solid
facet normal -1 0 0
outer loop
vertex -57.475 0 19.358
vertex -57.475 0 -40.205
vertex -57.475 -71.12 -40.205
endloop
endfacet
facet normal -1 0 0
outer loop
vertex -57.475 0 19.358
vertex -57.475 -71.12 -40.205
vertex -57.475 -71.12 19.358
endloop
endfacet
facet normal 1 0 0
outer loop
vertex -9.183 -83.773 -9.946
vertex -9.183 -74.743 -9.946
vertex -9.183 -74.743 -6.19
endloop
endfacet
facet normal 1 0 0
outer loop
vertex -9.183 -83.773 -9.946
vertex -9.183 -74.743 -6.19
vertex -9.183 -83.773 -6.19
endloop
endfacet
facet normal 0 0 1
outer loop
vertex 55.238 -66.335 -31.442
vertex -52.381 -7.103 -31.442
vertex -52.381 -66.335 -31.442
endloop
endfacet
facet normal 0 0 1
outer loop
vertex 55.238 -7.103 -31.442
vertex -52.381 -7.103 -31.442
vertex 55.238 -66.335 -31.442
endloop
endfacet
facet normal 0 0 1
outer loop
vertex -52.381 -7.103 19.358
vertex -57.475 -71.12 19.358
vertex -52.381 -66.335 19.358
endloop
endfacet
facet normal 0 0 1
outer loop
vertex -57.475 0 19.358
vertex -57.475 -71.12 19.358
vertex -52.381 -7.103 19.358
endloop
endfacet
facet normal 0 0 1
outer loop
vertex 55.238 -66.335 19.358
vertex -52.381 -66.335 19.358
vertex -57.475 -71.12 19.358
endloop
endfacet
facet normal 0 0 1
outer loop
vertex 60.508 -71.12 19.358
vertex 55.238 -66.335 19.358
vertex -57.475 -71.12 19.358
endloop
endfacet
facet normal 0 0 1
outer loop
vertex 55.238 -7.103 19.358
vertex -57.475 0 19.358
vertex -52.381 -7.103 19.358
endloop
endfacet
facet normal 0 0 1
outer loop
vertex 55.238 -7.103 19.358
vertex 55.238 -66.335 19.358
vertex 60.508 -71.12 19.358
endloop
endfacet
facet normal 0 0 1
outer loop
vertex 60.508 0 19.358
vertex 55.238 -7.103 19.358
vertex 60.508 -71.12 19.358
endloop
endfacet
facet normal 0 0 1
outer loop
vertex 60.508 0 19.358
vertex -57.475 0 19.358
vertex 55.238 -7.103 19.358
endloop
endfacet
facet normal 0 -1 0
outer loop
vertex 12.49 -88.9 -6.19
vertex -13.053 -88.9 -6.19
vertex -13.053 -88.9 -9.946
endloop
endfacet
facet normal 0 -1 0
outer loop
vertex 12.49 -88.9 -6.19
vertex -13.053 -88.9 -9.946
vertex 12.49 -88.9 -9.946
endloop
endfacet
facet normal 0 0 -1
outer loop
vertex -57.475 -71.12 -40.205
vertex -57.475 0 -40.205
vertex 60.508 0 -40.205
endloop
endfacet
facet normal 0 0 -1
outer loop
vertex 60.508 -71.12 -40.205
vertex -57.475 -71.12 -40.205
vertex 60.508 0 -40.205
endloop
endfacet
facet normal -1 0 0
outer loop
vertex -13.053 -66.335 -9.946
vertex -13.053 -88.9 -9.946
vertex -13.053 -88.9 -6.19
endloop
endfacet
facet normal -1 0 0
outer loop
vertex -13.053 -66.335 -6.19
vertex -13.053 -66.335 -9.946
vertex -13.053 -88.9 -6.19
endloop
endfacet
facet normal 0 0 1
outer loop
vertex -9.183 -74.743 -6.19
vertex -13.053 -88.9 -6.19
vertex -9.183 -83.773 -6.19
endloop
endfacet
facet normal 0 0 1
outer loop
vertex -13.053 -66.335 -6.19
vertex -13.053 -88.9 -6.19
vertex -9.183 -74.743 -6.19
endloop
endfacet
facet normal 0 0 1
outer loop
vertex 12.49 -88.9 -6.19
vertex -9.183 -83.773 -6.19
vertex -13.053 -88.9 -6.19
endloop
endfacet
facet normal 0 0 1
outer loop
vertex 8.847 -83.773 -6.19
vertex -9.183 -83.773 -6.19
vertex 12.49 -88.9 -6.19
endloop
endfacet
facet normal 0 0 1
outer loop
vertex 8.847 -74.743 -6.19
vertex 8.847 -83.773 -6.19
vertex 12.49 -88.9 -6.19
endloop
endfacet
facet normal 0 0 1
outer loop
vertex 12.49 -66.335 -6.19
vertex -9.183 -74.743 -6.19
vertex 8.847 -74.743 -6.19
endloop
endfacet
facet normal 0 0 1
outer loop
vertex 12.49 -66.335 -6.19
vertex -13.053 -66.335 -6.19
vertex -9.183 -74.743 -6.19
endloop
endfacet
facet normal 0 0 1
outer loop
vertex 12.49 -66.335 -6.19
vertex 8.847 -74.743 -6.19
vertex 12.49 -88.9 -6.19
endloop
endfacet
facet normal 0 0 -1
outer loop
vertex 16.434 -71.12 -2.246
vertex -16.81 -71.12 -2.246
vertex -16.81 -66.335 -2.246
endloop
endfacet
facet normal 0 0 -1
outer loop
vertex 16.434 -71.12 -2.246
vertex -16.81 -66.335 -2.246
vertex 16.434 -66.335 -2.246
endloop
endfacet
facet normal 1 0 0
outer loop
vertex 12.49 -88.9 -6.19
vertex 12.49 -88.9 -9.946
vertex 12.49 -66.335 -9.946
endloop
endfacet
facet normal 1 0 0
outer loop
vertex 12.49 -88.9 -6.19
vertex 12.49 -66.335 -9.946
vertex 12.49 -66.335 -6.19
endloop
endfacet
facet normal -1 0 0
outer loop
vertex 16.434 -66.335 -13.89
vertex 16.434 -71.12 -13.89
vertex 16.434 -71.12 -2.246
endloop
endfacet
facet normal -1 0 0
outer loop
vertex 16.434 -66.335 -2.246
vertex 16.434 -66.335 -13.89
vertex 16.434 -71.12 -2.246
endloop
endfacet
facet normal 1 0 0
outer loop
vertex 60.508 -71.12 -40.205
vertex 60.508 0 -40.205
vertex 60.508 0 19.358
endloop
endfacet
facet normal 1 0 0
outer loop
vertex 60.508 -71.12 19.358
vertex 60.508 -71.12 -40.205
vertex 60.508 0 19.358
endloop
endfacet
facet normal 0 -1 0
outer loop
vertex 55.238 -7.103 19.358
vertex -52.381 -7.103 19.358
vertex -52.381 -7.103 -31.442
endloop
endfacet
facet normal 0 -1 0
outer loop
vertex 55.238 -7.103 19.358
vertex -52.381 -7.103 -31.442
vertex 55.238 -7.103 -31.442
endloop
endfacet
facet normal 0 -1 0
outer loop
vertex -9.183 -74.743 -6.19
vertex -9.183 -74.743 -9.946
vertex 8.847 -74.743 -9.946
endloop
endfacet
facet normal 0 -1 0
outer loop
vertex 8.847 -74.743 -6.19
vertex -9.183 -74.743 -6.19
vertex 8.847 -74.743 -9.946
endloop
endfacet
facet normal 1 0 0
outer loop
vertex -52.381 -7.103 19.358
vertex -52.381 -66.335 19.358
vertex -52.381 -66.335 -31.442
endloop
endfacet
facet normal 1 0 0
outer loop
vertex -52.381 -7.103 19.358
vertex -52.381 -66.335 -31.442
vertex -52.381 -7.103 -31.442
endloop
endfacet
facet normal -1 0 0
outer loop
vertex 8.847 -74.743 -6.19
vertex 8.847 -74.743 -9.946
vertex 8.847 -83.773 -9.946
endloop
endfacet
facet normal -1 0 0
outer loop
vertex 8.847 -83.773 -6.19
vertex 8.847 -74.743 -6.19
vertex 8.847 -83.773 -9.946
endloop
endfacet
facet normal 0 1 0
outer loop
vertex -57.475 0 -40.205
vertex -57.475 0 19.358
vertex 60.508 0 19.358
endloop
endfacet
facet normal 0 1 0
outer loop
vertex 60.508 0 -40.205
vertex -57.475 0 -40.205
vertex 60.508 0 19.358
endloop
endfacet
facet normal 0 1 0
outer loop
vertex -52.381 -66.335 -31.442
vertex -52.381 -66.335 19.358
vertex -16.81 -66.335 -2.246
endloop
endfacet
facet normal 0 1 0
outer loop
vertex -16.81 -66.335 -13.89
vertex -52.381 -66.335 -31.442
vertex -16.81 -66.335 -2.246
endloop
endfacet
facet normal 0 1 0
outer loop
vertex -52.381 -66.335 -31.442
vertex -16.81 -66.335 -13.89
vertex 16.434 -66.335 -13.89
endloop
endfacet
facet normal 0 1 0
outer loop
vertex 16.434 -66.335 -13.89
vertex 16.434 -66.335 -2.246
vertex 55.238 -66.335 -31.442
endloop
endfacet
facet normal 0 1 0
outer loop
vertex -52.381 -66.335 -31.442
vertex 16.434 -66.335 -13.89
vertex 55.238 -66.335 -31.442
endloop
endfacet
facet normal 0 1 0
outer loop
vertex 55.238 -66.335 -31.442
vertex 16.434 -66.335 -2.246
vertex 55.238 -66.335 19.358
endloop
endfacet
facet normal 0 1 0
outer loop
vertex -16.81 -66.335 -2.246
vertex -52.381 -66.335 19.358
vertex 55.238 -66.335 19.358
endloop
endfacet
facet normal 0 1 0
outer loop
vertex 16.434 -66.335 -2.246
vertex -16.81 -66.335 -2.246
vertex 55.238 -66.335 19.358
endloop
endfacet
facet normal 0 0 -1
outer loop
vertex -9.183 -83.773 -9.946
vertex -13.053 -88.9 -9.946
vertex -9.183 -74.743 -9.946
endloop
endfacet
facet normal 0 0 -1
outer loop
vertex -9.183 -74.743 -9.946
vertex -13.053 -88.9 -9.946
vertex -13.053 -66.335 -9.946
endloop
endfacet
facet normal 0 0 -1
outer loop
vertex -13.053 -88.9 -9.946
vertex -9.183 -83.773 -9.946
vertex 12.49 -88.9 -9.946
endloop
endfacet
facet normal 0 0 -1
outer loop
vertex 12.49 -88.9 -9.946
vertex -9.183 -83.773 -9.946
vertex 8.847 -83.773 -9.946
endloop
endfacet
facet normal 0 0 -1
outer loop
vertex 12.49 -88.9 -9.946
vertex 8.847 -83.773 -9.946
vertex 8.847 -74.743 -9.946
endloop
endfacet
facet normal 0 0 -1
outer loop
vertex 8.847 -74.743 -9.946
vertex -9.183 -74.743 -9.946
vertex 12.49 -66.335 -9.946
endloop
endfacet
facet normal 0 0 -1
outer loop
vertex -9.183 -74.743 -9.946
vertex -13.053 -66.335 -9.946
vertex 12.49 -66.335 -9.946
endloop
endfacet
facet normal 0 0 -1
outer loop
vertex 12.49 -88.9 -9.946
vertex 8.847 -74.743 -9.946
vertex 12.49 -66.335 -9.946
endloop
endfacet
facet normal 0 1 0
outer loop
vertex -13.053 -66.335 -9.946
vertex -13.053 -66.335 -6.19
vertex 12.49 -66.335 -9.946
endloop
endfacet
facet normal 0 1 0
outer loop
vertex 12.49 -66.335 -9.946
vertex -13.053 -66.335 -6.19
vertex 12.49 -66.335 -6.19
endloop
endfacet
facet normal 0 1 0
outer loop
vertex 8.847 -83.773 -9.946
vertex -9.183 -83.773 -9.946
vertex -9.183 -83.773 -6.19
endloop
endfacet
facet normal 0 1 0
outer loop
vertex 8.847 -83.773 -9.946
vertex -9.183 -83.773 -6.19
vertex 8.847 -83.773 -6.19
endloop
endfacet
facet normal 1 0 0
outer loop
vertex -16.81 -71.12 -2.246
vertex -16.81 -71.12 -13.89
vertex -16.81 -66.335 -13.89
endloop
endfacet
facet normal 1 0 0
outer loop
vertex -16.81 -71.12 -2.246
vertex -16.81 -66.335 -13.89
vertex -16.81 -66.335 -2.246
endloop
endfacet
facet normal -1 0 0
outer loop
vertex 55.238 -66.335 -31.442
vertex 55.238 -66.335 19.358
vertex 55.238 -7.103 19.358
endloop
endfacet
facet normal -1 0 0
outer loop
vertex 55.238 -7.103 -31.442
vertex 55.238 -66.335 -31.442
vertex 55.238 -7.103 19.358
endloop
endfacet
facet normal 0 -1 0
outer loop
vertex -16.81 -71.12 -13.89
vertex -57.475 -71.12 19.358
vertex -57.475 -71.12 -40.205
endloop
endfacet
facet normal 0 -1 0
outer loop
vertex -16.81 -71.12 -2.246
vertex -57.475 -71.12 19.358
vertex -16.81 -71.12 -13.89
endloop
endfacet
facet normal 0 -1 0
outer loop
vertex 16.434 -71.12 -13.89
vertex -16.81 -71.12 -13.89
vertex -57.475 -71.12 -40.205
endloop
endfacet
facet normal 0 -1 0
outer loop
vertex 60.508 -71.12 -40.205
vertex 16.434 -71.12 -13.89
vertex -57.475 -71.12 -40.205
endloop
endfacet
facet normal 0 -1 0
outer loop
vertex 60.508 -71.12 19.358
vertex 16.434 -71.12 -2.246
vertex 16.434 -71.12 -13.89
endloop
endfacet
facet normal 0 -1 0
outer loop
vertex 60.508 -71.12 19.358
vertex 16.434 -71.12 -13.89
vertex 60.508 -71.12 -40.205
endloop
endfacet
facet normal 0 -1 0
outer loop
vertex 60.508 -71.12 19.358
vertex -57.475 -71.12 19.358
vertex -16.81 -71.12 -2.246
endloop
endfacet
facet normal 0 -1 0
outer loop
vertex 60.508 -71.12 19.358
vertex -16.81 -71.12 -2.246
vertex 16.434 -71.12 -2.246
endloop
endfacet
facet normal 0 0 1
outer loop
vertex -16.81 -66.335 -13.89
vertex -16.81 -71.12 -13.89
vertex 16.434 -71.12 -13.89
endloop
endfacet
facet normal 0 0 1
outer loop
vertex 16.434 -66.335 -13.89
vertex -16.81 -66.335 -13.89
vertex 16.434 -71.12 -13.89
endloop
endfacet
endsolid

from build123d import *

# Parameters (mm, degrees)
F0_W     = 117.983
F0_H     = 59.563
F1_DEPTH = 71.12
F2_W     = 33.243593
F2_H     = 11.644649
F3_DEPTH = 7.62
F4_W     = 25.543099
F4_H     = 3.756338
F5_DEPTH = 25.4
F6_W     = 18.030422
F6_H     = 9.030842
F7_DEPTH = 5.08
F8_W     = 107.619088
F8_H     = 59.231747
F9_DEPTH = 50.8


with BuildPart() as f1:
    # F0 (on Front) → F1 (new body)
    with BuildSketch(Plane.XZ):
        with Locations((1.516951, -10.423838)):
            Rectangle(F0_W, F0_H)
    extrude(amount=F1_DEPTH)

    # F2 (on face) → F3 (cut)
    with BuildSketch(Plane.XZ.offset(71.12)):
        with Locations((-0.187817, -8.067896)):
            Rectangle(F2_W, F2_H)
    extrude(amount=-F3_DEPTH, mode=Mode.SUBTRACT)

    # F4 (on face) → F5 (join)
    with BuildSketch(Plane.XZ.offset(63.5)):
        with Locations((-0.281726, -8.067896)):
            Rectangle(F4_W, F4_H)
    extrude(amount=F5_DEPTH)

    # F6 (on face) → F7 (cut)
    with BuildSketch(Plane(origin=(0, 0, -9.946065), x_dir=(1, 0, 0), z_dir=(0, 0, -1))):
        with Locations((-0.167796, 79.258036)):
            Rectangle(F6_W, F6_H)
    extrude(amount=-F7_DEPTH, mode=Mode.SUBTRACT)

    # F8 (on face) → F9 (cut)
    with BuildSketch(Plane.XY.offset(19.357662)):
        with Locations((1.428647, -36.718971)):
            Rectangle(F8_W, F8_H)
    extrude(amount=-F9_DEPTH, mode=Mode.SUBTRACT)


solid = f1.part
